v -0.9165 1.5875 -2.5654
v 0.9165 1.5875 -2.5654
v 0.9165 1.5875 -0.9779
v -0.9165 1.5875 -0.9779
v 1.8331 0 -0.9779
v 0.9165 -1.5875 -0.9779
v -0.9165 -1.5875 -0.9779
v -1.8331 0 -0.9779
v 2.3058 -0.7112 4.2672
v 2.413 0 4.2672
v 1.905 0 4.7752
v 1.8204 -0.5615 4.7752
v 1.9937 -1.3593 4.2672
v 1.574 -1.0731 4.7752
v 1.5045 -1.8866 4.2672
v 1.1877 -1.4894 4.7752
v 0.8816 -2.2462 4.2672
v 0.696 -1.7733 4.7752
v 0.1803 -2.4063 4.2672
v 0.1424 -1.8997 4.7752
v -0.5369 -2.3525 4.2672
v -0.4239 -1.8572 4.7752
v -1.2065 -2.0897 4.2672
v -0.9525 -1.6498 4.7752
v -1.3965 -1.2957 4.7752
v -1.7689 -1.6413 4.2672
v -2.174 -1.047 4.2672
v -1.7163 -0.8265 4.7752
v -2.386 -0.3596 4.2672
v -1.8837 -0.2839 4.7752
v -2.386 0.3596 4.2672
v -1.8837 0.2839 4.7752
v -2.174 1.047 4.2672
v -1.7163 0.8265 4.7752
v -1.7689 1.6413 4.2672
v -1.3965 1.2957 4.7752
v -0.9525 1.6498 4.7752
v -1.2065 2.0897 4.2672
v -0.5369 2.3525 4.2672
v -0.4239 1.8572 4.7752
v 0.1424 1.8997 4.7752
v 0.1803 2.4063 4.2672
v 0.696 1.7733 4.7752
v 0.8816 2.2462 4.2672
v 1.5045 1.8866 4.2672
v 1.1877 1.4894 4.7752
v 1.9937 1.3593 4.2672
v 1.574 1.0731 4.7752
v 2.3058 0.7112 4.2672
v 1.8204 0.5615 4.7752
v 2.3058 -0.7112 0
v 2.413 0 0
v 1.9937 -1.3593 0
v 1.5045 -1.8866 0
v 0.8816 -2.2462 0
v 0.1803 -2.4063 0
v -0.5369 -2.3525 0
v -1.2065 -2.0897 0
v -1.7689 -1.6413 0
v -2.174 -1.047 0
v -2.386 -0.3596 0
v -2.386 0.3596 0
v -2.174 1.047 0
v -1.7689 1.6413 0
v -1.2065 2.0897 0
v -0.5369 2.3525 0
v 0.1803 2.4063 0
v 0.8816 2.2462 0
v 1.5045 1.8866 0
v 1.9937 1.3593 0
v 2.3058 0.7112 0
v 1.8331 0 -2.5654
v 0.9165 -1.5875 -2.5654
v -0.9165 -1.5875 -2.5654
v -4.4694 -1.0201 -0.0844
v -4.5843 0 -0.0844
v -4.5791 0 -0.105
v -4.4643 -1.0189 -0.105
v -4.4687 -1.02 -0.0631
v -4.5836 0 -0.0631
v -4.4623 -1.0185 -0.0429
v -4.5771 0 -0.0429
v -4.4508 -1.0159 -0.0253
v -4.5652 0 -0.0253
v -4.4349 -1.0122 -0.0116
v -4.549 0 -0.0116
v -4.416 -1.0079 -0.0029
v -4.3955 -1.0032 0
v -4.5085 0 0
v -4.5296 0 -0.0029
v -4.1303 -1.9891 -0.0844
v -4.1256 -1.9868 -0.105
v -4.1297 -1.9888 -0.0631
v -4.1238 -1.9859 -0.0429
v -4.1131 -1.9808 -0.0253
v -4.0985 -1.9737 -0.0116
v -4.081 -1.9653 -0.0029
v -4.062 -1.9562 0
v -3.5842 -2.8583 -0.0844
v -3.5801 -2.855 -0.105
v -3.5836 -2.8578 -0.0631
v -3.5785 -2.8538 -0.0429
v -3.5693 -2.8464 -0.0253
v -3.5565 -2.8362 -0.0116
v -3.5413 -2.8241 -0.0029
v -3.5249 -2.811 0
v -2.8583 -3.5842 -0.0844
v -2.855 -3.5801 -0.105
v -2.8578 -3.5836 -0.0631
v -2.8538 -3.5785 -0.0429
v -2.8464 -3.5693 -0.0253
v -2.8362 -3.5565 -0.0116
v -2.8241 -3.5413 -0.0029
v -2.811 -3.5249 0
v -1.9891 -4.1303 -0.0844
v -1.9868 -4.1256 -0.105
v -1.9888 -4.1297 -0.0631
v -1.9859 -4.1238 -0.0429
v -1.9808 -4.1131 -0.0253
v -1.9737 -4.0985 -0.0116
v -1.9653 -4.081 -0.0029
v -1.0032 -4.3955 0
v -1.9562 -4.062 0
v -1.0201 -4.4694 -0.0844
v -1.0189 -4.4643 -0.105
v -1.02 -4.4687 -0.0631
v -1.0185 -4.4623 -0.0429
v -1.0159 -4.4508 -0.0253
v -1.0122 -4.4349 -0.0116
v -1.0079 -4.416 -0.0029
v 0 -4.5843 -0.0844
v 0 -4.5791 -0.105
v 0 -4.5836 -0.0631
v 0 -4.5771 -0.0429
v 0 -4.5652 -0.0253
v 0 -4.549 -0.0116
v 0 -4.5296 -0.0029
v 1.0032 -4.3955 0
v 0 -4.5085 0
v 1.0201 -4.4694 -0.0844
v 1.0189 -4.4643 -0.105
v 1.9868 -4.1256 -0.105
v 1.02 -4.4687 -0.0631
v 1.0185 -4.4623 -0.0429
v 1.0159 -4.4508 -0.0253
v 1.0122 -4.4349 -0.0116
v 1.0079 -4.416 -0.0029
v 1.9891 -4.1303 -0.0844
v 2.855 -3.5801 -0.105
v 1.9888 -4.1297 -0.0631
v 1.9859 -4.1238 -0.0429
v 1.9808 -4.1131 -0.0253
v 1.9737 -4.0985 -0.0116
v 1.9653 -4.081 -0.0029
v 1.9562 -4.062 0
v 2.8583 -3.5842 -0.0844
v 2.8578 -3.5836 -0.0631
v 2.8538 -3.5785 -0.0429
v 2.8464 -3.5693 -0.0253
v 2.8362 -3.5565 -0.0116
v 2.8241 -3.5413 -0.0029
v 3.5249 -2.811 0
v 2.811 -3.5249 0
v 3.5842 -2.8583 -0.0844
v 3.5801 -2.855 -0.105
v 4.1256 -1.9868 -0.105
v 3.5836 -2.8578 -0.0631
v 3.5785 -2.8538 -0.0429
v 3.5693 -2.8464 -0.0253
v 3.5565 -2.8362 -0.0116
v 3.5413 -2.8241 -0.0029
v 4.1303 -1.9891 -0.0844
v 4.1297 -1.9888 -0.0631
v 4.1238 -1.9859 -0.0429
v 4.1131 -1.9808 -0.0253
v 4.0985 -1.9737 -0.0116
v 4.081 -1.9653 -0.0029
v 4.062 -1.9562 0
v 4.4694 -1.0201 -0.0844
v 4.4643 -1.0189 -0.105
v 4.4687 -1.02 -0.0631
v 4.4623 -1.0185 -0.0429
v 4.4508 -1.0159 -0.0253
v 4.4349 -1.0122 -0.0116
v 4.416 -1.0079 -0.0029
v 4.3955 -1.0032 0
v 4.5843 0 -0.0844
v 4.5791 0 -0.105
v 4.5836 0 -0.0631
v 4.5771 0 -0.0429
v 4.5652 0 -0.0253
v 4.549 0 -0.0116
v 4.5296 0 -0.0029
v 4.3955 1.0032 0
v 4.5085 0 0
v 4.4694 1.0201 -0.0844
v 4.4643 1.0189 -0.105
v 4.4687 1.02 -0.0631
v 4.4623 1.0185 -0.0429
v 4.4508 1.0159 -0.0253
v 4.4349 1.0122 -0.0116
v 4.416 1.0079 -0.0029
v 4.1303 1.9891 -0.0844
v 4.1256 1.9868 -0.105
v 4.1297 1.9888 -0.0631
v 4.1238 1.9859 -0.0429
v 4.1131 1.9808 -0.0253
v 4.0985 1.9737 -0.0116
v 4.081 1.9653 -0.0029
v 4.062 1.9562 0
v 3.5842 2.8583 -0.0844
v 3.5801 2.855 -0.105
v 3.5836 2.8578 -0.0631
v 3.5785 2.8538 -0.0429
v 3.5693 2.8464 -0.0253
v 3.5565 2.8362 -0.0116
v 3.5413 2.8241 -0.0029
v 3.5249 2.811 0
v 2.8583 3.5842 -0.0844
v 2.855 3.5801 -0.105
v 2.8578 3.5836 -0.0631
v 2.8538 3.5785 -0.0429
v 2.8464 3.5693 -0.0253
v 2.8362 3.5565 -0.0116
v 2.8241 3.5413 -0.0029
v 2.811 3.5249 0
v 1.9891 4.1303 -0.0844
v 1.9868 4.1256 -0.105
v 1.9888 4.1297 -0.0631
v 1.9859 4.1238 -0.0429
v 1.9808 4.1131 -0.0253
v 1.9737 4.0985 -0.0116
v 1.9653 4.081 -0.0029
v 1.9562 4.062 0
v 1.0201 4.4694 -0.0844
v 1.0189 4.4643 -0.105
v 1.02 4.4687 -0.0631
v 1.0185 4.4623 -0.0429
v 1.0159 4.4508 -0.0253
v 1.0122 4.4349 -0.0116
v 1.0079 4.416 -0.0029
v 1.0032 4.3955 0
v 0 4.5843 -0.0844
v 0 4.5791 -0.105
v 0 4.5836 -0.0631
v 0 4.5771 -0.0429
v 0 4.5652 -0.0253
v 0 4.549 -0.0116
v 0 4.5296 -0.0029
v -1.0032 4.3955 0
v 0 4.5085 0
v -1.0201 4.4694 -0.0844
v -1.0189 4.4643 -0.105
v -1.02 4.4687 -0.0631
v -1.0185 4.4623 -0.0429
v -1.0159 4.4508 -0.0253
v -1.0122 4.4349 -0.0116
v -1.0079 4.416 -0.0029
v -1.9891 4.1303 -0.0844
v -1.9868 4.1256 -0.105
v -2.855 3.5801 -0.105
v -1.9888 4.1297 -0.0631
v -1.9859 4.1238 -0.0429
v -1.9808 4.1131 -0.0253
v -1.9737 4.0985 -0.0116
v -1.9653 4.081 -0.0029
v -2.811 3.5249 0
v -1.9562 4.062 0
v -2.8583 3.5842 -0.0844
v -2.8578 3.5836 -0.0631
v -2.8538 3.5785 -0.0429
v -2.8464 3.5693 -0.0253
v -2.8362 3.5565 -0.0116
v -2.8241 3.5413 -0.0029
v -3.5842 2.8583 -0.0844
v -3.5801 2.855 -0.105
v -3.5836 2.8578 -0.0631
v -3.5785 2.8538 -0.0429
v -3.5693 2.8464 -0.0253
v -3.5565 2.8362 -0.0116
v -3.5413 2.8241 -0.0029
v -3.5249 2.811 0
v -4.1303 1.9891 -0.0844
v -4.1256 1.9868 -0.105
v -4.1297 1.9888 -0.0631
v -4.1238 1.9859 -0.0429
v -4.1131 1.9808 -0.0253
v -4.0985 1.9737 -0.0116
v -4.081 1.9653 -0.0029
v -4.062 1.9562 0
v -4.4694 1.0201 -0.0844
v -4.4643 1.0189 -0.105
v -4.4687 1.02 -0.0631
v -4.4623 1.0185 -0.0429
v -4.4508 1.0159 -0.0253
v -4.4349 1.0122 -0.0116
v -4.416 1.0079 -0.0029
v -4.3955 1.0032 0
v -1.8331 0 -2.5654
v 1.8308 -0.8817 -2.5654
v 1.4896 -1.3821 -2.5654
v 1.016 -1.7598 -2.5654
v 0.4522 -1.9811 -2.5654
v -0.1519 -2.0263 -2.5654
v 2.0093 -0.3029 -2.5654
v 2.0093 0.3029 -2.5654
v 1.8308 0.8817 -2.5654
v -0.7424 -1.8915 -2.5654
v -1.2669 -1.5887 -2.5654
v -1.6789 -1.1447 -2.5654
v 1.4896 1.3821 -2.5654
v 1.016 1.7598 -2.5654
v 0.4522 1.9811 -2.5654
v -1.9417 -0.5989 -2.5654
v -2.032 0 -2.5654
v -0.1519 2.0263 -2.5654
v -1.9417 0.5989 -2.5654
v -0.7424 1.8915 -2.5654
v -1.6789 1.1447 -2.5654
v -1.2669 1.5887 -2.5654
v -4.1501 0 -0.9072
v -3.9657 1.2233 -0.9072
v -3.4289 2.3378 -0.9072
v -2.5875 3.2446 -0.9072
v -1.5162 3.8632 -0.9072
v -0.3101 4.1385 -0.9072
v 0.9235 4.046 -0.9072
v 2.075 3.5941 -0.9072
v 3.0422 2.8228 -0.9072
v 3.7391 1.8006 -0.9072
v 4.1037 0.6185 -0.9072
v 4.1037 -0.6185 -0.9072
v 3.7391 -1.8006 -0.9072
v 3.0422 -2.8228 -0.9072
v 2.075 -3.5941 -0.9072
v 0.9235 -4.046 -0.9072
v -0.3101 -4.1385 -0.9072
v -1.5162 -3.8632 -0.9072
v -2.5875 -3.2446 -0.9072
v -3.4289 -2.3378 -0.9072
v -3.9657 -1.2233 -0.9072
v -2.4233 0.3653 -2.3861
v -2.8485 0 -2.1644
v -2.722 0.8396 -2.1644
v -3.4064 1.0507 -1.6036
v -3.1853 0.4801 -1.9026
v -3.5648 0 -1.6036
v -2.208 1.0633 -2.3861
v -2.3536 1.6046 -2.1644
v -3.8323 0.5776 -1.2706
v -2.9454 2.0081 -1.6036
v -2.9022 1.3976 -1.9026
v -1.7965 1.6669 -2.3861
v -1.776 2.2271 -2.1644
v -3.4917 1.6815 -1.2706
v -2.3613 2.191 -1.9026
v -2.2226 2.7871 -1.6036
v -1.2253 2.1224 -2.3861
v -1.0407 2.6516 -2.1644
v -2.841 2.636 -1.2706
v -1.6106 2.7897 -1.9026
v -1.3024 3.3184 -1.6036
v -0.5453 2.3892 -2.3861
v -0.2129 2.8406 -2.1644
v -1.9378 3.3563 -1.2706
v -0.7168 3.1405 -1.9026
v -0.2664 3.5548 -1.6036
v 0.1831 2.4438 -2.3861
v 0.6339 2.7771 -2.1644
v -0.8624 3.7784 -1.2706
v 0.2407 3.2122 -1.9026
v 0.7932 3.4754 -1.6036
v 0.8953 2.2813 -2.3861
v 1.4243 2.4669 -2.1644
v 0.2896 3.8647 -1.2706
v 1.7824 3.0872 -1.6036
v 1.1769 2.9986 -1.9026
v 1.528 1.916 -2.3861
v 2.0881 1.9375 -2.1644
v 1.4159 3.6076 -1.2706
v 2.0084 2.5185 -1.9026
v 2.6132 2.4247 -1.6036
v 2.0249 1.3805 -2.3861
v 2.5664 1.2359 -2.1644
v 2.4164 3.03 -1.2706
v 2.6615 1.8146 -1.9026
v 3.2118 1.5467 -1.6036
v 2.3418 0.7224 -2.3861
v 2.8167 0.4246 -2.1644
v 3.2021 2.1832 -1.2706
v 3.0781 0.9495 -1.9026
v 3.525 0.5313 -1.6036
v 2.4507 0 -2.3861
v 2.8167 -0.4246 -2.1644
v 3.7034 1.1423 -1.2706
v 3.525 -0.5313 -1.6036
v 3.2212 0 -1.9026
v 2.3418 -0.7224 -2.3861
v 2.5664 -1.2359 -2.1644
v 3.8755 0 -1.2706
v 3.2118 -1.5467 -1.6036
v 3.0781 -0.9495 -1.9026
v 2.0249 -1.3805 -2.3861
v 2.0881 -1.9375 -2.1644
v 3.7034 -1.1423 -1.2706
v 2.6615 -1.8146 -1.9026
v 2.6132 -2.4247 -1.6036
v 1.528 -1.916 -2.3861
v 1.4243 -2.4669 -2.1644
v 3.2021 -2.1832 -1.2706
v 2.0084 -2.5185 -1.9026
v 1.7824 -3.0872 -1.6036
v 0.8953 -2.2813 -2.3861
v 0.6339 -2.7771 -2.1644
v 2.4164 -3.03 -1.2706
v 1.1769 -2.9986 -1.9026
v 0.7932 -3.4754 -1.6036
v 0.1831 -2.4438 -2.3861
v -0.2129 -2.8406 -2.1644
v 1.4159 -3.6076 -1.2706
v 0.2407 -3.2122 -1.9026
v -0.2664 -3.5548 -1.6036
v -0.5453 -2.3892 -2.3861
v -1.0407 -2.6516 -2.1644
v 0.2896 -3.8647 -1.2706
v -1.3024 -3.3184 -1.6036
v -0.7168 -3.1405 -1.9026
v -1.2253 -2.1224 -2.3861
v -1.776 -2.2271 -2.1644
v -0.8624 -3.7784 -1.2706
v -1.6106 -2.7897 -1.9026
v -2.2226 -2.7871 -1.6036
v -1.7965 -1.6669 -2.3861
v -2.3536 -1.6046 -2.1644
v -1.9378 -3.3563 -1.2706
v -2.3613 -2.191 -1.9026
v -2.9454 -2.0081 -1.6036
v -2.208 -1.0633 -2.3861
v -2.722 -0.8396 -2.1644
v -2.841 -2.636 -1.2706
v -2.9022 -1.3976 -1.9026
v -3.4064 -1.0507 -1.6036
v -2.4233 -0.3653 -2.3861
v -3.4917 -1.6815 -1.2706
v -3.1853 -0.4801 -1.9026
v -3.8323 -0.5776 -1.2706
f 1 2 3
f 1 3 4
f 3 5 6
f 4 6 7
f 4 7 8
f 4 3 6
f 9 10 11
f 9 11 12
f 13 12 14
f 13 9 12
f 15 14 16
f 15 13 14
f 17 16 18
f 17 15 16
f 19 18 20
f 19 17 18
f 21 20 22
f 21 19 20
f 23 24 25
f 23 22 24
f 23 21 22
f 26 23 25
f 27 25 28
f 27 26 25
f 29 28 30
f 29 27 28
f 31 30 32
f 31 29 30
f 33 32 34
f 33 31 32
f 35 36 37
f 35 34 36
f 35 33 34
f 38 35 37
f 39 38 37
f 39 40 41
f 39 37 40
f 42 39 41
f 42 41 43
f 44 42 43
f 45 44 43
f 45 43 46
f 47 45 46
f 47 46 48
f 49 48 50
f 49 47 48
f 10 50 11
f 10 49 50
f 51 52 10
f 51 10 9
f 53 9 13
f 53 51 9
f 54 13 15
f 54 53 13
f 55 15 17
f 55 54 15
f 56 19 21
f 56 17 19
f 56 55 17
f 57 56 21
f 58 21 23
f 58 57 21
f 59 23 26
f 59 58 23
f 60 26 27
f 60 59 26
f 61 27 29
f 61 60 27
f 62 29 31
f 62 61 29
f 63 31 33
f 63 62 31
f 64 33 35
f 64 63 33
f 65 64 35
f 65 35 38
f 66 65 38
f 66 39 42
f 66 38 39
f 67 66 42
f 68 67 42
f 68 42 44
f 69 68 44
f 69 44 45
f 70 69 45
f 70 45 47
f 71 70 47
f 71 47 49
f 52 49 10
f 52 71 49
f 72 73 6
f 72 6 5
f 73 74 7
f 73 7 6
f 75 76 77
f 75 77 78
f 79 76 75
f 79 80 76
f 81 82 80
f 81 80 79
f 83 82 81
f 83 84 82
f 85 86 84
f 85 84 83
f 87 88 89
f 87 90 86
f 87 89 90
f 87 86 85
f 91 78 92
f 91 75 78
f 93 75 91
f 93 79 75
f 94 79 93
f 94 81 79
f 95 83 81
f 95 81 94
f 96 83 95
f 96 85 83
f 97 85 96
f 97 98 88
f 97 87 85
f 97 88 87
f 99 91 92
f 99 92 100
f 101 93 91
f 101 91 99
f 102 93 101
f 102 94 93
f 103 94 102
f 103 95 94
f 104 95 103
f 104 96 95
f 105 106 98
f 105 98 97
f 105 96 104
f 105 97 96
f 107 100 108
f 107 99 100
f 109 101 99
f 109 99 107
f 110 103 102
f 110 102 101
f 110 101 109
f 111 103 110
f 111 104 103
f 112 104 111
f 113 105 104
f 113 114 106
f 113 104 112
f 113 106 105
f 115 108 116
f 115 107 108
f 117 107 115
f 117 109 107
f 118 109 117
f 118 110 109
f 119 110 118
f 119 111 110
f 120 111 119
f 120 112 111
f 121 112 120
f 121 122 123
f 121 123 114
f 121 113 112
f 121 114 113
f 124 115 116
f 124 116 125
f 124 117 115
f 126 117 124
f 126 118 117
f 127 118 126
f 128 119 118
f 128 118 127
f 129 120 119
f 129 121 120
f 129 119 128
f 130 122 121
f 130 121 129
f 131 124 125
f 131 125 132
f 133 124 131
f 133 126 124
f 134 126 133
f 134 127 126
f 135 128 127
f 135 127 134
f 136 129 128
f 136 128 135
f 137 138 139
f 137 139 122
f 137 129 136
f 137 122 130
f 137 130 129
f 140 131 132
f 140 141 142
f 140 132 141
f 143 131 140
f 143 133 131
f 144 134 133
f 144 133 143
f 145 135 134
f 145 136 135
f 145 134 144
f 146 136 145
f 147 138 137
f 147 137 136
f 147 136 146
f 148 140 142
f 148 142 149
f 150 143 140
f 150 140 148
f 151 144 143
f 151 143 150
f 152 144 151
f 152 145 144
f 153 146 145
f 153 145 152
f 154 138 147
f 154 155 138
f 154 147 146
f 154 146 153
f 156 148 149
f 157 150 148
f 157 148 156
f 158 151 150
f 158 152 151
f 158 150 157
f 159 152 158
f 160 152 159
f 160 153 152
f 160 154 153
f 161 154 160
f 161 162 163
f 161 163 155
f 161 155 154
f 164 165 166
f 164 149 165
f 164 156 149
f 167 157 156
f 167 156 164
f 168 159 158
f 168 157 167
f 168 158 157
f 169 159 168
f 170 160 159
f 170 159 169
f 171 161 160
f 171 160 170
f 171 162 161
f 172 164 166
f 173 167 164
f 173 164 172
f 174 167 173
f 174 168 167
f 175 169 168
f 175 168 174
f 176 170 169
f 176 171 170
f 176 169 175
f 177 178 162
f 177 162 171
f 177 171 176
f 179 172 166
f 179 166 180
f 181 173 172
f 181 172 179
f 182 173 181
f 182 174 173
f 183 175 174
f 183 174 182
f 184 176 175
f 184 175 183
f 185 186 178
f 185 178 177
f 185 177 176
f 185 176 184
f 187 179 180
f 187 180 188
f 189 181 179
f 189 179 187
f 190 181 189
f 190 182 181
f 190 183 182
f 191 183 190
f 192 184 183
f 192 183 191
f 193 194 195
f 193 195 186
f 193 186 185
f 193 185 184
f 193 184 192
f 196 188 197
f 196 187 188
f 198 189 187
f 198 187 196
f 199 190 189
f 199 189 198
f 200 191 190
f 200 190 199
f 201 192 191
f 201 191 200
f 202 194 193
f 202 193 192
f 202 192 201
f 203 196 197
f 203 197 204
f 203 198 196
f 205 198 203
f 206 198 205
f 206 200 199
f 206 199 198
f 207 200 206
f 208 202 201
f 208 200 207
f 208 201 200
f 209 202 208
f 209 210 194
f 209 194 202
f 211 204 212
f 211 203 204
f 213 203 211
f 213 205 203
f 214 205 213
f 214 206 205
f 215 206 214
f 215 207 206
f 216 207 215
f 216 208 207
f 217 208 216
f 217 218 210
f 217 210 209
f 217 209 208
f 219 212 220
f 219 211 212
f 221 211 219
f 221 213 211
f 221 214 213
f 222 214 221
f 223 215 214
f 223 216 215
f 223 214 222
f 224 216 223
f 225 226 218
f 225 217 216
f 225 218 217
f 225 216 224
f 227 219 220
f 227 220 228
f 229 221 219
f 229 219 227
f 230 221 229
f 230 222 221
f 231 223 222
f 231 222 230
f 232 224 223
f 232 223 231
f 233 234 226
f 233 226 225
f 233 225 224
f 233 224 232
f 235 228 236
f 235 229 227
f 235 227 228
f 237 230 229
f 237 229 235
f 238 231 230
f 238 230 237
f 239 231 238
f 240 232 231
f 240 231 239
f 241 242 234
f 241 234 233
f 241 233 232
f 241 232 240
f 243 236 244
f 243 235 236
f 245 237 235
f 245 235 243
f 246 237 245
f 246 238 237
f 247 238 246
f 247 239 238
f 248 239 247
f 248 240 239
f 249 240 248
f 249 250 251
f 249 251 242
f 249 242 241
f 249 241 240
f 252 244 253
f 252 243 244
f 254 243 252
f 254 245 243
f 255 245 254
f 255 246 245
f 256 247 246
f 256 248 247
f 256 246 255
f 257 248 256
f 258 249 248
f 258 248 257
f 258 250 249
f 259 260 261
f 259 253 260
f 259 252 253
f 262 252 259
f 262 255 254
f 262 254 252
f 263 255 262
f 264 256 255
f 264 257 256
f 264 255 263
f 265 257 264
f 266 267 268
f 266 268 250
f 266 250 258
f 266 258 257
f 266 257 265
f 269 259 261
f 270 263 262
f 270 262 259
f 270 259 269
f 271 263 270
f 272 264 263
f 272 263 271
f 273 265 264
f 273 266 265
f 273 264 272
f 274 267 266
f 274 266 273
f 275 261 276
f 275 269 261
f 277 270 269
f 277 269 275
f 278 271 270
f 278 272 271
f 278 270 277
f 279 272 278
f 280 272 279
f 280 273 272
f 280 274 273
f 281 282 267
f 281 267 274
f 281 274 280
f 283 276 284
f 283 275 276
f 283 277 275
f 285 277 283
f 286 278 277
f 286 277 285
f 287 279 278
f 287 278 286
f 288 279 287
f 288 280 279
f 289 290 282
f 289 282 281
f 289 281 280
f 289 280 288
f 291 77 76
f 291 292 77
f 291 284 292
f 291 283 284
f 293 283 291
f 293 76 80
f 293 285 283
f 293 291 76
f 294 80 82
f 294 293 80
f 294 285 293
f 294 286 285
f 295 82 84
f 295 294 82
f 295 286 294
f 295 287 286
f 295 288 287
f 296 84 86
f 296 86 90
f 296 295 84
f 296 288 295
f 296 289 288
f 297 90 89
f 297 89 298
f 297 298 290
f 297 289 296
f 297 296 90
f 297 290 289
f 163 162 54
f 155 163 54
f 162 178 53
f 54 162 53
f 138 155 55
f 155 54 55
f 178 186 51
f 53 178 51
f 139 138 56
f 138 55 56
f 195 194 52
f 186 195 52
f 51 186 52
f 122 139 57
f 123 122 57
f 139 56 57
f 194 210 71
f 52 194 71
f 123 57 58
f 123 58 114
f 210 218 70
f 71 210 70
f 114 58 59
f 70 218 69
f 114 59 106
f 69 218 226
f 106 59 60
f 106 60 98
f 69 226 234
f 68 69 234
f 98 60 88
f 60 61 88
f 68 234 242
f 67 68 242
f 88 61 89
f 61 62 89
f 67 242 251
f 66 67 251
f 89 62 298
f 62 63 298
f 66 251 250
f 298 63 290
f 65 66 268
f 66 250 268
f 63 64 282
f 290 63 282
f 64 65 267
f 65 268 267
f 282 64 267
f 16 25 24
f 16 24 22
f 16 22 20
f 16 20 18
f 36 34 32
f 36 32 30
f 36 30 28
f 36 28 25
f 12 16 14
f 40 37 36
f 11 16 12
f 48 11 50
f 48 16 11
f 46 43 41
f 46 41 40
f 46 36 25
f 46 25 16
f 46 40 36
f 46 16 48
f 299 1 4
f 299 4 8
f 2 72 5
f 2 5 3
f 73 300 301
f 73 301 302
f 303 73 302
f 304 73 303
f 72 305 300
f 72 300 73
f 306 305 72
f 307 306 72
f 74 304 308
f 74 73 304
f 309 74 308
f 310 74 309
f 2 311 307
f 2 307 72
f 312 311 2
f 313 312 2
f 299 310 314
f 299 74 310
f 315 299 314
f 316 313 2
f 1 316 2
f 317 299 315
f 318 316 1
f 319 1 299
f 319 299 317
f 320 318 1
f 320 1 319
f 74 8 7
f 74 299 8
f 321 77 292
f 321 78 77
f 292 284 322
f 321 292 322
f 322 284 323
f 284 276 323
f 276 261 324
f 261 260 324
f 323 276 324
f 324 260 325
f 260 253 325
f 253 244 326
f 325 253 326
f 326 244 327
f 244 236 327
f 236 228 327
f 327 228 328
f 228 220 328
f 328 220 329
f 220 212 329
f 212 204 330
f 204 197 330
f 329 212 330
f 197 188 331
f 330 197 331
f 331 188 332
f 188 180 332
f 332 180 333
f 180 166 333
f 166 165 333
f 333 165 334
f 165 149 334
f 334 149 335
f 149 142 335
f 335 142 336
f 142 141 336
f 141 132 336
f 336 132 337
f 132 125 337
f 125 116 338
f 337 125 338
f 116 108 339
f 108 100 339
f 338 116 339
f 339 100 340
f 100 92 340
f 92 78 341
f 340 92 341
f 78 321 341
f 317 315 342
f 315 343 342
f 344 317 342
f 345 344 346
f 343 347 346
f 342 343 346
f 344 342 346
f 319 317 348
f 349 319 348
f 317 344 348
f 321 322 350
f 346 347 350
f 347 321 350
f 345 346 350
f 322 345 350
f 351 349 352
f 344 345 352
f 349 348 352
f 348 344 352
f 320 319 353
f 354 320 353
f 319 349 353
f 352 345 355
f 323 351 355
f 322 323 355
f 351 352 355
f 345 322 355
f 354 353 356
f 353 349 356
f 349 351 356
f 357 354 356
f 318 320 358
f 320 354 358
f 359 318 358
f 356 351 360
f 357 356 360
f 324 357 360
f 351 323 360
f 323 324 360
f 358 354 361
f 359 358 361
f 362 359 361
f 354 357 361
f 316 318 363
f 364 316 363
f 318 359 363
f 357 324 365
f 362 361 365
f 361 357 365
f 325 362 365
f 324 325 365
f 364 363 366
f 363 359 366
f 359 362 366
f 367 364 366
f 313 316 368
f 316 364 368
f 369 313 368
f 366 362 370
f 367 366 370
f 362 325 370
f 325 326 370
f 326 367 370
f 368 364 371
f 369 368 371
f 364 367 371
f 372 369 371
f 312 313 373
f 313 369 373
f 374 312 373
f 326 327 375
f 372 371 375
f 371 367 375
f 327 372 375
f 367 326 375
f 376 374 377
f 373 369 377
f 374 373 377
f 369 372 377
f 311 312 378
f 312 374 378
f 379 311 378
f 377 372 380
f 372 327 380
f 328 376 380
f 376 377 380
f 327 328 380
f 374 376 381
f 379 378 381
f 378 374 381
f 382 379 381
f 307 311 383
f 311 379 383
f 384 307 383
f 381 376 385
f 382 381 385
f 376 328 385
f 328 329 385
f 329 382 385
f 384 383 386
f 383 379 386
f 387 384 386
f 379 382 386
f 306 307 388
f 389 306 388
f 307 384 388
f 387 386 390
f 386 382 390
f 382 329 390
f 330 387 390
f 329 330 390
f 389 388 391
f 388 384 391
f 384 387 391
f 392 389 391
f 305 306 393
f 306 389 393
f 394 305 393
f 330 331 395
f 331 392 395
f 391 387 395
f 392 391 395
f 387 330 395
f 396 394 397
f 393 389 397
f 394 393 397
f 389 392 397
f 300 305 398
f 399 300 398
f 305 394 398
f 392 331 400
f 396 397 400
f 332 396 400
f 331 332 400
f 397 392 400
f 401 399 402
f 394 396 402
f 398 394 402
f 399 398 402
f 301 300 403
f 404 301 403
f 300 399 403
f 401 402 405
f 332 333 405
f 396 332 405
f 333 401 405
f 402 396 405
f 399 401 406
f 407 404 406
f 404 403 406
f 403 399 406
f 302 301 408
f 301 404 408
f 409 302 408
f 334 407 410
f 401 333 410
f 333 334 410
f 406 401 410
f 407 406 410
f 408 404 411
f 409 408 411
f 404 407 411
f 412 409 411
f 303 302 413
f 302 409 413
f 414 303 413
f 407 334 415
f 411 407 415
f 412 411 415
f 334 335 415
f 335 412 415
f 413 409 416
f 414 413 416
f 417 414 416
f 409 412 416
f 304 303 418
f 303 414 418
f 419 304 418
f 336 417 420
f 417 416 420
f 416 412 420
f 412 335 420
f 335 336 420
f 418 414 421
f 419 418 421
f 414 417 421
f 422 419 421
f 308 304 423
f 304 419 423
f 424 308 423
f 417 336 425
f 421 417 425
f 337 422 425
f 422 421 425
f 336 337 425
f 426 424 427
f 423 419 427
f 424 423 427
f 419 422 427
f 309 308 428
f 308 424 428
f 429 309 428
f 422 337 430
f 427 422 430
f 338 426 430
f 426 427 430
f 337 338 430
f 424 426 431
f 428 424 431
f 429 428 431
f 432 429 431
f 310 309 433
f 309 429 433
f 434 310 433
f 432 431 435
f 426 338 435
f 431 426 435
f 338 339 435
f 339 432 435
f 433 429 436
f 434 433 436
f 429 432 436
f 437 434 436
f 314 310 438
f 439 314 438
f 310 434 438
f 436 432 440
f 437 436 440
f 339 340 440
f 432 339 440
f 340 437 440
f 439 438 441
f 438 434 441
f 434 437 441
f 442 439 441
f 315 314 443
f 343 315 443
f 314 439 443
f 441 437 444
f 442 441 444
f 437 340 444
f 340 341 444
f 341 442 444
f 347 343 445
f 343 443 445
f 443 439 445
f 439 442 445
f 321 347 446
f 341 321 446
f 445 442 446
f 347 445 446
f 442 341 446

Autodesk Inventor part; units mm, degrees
ref_plane "YZ Plane" through (0, 0, 0) normal (1, 0, 0) x (0, 1, 0)
ref_plane "XZ Plane" through (0, 0, 0) normal (0, 1, 0) x (-1, 0, 0)
ref_plane "XY Plane" through (0, 0, 0) normal (0, 0, 1) x (1, 0, 0)
sketch "Sketch1" plane through (0, 0, 0) normal (0, 0, 1) x (1, 0, 0)
  circle A0 centre (0, 0) radius 2.413
  dimension "d0" = 4.826
extrude "Extrusion1" add sketch "Sketch1" along normal blind 4.7752
sketch "Sketch2" plane through (0, 0, 0) normal (0, 1, 0) x (-1, 0, 0)
  line L0 (0, 0) -> (0, -2.5654)
  line L1 (0, 0) -> (4.5085, 0)
  line L2 (0, -2.5654) -> (2.032, -2.5654)
  line L3 (4.5085, 0) -> (4.5085, 4.071) construction
  arc A0 (4.5791, -0.105) -> (4.5085, 0) centre (4.5085, -0.0762) ccw
  arc A1 (2.032, -2.5654) -> (4.5791, -0.105) centre (0.5168, 1.5517) ccw
  line L4 (4.5847, 0.6553) -> (4.5847, -0.0762) construction
  dimension "d3" = 2.5654
  dimension "d6" = 2.032
  dimension "d12" = 4.5847
  dimension "d18" = 0.0762
revolve "Revolution1" add sketch "Sketch2" angle 360 about axis through (0, 0, 0) along (0, 0, -1)
sketch "Sketch3" plane through (0, 0, -2.5654) normal (0, 0, -1) x (-1, 0, 0)
  circle A0 centre (0, 0) radius 2.032 projected
  line L0 (-0.9165, 1.5875) -> (0.9165, 1.5875)
  line L1 (0.9165, 1.5875) -> (1.8331, 0)
  line L2 (1.8331, 0) -> (0.9165, -1.5875)
  line L3 (0.9165, -1.5875) -> (-0.9165, -1.5875)
  line L4 (-0.9165, -1.5875) -> (-1.8331, 0)
  line L5 (-1.8331, 0) -> (-0.9165, 1.5875)
  dimension "d8" = 3.175
extrude "Extrusion2" cut sketch "Sketch3" against normal blind 1.5875 contours L0 L1 L2 L3 L4 L5
chamfer "Chamfer1" distance 0.508 angle 45 1 edges at (-2.413, 0, 4.7752)
thread "Thread1" size "10-32 UNF" class "2A" standard "ANSI Unified Screw Threads" full length
properties part number "10-32 BHCS x375" material "Steel"
